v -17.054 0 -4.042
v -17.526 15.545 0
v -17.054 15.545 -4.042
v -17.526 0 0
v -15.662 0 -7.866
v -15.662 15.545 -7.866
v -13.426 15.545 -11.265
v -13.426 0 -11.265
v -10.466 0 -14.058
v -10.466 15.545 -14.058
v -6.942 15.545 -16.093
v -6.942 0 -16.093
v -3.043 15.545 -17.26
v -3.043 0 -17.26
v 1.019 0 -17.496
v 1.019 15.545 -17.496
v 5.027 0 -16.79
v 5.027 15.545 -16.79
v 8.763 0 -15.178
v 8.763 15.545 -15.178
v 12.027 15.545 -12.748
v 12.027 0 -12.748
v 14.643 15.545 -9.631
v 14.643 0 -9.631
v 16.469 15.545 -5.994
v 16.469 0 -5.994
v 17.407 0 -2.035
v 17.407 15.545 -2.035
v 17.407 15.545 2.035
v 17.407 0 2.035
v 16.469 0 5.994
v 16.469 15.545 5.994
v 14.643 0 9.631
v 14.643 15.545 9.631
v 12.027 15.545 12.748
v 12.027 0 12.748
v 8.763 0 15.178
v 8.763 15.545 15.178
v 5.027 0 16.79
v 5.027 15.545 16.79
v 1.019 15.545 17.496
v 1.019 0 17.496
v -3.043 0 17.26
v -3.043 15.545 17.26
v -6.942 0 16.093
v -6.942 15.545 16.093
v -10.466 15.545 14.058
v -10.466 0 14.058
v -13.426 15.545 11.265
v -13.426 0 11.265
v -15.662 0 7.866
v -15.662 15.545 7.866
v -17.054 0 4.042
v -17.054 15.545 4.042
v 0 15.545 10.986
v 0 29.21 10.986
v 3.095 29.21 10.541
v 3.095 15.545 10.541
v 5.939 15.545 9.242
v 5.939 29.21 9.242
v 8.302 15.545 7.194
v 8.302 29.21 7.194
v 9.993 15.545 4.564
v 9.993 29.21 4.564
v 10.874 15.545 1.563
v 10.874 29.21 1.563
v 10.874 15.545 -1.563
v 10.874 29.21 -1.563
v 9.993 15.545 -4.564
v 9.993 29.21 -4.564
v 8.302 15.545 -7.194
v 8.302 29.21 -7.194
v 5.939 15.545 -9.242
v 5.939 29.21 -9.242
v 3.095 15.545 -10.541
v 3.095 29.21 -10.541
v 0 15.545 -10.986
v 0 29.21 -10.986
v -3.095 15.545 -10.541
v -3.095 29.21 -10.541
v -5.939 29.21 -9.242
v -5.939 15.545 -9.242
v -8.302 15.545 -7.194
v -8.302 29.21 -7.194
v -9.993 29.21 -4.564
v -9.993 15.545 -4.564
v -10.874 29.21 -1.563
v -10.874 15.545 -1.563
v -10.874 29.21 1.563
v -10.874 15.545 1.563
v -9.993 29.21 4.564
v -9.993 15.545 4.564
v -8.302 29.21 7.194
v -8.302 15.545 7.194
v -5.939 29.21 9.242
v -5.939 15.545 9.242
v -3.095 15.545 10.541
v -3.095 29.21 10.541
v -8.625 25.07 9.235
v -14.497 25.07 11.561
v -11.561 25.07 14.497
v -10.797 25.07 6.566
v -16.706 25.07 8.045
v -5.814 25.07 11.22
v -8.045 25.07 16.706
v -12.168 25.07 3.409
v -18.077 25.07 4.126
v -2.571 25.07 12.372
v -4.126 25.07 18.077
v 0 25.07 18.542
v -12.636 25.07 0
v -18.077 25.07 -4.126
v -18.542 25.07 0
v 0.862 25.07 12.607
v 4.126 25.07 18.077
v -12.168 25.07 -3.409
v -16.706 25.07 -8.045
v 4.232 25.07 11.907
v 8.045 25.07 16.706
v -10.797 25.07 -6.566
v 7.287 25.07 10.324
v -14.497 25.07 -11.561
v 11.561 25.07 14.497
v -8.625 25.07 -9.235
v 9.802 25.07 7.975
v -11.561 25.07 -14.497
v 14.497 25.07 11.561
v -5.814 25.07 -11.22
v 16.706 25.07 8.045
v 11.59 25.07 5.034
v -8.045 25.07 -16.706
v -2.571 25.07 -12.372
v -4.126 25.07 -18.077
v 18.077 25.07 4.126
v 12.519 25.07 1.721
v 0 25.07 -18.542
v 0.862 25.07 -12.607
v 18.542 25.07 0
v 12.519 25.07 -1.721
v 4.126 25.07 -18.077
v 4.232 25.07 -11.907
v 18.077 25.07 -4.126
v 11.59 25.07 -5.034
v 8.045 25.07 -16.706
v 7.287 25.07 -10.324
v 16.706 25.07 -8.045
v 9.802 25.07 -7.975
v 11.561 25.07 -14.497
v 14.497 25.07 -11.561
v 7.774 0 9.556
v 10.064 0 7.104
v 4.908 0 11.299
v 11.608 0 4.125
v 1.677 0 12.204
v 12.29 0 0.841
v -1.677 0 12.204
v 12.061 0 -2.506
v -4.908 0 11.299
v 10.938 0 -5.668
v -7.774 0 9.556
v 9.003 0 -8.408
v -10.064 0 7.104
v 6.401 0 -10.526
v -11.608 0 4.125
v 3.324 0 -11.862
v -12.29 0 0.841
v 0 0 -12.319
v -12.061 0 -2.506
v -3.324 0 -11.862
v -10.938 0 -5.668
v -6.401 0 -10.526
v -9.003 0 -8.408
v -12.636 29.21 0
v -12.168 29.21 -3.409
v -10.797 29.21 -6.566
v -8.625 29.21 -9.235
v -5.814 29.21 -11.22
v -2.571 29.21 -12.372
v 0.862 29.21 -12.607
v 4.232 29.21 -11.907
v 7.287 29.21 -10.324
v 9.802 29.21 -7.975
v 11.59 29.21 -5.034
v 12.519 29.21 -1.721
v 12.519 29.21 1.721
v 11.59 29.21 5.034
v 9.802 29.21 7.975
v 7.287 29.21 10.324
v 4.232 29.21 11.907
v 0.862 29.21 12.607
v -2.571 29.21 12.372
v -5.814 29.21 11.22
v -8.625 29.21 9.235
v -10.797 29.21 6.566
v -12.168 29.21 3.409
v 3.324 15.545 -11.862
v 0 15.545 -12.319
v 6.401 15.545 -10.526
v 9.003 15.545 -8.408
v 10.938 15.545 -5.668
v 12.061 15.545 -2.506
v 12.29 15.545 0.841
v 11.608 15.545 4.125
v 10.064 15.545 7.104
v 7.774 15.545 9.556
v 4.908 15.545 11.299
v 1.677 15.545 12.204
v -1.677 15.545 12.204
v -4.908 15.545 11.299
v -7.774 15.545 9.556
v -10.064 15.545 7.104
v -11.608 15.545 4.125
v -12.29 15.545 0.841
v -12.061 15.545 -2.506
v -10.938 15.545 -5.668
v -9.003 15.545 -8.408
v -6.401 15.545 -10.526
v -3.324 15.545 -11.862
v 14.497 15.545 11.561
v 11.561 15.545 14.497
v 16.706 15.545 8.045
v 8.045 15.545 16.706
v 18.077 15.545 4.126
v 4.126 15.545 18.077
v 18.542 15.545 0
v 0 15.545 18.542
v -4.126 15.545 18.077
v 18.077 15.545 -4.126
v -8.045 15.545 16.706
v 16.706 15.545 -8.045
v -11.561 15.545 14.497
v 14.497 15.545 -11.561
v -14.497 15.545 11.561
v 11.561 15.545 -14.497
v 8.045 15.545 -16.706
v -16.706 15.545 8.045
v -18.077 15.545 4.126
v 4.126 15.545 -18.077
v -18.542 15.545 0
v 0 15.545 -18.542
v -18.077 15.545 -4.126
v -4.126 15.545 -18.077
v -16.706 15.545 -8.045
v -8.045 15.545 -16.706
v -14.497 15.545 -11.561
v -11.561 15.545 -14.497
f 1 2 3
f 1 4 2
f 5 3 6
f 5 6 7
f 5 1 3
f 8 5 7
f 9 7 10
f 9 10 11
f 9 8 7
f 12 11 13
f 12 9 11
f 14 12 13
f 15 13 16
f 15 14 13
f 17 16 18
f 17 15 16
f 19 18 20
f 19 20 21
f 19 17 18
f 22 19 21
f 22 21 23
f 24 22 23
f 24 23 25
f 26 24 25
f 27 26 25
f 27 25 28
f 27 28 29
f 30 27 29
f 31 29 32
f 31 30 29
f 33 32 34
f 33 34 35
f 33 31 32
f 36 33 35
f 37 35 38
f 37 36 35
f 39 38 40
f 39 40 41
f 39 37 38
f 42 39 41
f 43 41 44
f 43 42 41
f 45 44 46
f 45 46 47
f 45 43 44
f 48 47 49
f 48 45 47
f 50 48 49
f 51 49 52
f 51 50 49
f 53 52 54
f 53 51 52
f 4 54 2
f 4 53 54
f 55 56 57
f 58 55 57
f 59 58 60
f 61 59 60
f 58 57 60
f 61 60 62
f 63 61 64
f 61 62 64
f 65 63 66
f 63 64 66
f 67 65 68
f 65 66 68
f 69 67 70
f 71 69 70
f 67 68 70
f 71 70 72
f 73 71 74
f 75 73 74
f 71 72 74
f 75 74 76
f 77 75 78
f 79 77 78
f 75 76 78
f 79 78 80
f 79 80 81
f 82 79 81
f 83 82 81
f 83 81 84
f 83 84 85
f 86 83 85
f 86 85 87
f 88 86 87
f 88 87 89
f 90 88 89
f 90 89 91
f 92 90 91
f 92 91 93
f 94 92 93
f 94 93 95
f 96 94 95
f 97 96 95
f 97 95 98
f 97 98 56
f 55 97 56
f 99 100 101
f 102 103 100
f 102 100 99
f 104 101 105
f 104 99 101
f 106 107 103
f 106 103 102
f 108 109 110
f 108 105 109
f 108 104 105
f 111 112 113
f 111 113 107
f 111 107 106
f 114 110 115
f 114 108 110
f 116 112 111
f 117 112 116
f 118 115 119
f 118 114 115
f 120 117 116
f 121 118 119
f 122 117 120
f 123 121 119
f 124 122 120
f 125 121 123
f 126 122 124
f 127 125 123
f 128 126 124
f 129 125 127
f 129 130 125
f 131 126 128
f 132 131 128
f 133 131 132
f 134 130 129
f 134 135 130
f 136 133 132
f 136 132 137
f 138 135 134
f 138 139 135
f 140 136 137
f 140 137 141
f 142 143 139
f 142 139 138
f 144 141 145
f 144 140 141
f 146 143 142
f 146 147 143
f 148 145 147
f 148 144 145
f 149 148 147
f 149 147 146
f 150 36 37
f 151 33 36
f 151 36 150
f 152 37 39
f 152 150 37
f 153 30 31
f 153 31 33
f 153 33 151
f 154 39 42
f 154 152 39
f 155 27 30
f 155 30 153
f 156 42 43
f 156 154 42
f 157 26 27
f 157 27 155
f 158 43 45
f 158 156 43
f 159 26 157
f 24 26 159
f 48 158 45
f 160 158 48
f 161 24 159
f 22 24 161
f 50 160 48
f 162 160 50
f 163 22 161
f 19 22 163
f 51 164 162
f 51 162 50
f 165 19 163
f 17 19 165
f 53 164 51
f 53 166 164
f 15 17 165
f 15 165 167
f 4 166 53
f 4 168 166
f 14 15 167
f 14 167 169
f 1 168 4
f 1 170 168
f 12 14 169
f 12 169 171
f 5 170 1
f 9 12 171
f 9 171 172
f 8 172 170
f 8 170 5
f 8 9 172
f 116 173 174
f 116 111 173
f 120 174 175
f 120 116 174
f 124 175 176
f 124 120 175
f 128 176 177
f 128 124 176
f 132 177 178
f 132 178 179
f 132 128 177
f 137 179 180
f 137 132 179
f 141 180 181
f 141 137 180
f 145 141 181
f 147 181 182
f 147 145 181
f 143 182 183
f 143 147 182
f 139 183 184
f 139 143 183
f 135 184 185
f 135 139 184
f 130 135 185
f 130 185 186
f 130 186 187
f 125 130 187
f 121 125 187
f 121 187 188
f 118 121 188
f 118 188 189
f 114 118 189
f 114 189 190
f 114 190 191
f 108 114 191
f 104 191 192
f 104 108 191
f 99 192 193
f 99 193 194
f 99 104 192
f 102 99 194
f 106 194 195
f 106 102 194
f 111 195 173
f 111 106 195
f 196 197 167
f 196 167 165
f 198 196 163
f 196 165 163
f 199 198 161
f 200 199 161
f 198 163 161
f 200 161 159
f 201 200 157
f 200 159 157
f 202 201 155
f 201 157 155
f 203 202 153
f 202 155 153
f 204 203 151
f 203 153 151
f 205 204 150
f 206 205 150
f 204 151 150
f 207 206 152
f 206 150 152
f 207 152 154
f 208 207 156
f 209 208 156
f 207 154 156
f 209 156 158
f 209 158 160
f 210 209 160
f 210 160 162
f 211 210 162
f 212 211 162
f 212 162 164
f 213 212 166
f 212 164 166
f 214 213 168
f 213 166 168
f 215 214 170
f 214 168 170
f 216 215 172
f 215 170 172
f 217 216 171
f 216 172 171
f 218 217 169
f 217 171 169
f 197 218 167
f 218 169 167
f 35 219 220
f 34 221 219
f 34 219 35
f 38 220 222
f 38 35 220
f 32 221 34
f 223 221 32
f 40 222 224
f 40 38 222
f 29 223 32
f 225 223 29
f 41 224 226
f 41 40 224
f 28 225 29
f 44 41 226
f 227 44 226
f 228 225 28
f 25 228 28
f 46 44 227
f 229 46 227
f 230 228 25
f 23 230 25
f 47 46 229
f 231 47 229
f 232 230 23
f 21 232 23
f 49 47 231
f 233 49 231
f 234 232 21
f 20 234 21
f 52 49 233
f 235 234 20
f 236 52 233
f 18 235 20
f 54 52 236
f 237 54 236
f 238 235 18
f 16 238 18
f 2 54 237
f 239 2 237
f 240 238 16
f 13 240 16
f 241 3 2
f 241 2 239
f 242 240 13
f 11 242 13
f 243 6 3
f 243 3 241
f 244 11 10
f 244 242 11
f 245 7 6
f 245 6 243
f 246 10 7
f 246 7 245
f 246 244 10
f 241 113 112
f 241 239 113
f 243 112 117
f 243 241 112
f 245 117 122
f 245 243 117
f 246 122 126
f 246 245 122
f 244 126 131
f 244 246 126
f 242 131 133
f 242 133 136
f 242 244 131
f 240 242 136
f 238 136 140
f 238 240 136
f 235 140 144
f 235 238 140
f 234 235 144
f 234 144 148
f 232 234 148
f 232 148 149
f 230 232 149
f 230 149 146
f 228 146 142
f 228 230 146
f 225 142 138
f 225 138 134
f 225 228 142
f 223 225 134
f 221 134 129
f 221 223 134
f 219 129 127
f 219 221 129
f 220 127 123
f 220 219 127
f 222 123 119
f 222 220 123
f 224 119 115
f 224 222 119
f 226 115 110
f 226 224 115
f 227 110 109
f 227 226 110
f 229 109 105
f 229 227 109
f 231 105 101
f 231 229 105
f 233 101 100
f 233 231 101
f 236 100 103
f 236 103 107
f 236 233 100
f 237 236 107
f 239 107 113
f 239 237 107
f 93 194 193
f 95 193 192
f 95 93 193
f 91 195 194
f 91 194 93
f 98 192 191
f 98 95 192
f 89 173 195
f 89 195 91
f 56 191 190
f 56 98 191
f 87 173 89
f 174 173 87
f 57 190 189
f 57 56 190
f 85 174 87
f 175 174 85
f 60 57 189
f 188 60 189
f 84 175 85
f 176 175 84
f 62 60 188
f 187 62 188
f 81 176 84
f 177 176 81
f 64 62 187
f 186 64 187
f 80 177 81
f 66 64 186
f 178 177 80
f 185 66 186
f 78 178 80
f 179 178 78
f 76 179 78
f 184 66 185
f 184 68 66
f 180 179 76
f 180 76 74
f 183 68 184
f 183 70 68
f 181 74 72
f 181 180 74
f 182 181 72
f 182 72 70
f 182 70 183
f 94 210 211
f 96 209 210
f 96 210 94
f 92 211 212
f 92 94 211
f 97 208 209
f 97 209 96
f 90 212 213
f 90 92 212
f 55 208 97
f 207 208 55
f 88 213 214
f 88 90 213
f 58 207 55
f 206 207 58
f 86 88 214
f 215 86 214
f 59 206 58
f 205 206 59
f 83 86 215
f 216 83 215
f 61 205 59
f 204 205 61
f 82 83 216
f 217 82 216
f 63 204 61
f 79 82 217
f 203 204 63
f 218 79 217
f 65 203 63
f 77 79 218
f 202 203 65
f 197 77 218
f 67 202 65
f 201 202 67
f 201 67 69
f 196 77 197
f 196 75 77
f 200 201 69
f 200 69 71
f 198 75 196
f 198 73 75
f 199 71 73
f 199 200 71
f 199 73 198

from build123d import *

# Parameters (mm, degrees)
SKETCH2_R          = 12.319
CUT_EXTRUDE2_DEPTH = 15.5448
SKETCH3_R          = 10.9855
CUT_EXTRUDE3_DEPTH = 40.253479183


with BuildPart() as part:
    # Sketch1 → Revolve2 (revolve)
    with BuildSketch(Plane.XY):
        Polygon((-18.542, 15.5448), (-17.526, 15.5448), (-17.526, 0), (0, 0), (0, 29.21), (-12.6365, 29.21), (-12.6365, 25.0698), (-18.542, 25.0698), align=None)
    revolve(axis=Axis((0, 29.21, 0), (0, -1, 0)))

    # Sketch2 → Cut-Extrude2 (cut)
    with BuildSketch(Plane.XZ):
        with Locations(Location((0, 0, 0), (0, 0, 270))):
            Circle(SKETCH2_R)
    extrude(amount=-CUT_EXTRUDE2_DEPTH, mode=Mode.SUBTRACT)

    # Sketch3 → Cut-Extrude3 (cut, through all)
    with BuildSketch(Plane(origin=(0, 29.21, 0), x_dir=(1, 0, 0), z_dir=(0, 1, 0))):
        with Locations(Location((0, 0, 0), (0, 0, 270))):
            Circle(SKETCH3_R)
    extrude(amount=-CUT_EXTRUDE3_DEPTH, mode=Mode.SUBTRACT)


solid = part.part
